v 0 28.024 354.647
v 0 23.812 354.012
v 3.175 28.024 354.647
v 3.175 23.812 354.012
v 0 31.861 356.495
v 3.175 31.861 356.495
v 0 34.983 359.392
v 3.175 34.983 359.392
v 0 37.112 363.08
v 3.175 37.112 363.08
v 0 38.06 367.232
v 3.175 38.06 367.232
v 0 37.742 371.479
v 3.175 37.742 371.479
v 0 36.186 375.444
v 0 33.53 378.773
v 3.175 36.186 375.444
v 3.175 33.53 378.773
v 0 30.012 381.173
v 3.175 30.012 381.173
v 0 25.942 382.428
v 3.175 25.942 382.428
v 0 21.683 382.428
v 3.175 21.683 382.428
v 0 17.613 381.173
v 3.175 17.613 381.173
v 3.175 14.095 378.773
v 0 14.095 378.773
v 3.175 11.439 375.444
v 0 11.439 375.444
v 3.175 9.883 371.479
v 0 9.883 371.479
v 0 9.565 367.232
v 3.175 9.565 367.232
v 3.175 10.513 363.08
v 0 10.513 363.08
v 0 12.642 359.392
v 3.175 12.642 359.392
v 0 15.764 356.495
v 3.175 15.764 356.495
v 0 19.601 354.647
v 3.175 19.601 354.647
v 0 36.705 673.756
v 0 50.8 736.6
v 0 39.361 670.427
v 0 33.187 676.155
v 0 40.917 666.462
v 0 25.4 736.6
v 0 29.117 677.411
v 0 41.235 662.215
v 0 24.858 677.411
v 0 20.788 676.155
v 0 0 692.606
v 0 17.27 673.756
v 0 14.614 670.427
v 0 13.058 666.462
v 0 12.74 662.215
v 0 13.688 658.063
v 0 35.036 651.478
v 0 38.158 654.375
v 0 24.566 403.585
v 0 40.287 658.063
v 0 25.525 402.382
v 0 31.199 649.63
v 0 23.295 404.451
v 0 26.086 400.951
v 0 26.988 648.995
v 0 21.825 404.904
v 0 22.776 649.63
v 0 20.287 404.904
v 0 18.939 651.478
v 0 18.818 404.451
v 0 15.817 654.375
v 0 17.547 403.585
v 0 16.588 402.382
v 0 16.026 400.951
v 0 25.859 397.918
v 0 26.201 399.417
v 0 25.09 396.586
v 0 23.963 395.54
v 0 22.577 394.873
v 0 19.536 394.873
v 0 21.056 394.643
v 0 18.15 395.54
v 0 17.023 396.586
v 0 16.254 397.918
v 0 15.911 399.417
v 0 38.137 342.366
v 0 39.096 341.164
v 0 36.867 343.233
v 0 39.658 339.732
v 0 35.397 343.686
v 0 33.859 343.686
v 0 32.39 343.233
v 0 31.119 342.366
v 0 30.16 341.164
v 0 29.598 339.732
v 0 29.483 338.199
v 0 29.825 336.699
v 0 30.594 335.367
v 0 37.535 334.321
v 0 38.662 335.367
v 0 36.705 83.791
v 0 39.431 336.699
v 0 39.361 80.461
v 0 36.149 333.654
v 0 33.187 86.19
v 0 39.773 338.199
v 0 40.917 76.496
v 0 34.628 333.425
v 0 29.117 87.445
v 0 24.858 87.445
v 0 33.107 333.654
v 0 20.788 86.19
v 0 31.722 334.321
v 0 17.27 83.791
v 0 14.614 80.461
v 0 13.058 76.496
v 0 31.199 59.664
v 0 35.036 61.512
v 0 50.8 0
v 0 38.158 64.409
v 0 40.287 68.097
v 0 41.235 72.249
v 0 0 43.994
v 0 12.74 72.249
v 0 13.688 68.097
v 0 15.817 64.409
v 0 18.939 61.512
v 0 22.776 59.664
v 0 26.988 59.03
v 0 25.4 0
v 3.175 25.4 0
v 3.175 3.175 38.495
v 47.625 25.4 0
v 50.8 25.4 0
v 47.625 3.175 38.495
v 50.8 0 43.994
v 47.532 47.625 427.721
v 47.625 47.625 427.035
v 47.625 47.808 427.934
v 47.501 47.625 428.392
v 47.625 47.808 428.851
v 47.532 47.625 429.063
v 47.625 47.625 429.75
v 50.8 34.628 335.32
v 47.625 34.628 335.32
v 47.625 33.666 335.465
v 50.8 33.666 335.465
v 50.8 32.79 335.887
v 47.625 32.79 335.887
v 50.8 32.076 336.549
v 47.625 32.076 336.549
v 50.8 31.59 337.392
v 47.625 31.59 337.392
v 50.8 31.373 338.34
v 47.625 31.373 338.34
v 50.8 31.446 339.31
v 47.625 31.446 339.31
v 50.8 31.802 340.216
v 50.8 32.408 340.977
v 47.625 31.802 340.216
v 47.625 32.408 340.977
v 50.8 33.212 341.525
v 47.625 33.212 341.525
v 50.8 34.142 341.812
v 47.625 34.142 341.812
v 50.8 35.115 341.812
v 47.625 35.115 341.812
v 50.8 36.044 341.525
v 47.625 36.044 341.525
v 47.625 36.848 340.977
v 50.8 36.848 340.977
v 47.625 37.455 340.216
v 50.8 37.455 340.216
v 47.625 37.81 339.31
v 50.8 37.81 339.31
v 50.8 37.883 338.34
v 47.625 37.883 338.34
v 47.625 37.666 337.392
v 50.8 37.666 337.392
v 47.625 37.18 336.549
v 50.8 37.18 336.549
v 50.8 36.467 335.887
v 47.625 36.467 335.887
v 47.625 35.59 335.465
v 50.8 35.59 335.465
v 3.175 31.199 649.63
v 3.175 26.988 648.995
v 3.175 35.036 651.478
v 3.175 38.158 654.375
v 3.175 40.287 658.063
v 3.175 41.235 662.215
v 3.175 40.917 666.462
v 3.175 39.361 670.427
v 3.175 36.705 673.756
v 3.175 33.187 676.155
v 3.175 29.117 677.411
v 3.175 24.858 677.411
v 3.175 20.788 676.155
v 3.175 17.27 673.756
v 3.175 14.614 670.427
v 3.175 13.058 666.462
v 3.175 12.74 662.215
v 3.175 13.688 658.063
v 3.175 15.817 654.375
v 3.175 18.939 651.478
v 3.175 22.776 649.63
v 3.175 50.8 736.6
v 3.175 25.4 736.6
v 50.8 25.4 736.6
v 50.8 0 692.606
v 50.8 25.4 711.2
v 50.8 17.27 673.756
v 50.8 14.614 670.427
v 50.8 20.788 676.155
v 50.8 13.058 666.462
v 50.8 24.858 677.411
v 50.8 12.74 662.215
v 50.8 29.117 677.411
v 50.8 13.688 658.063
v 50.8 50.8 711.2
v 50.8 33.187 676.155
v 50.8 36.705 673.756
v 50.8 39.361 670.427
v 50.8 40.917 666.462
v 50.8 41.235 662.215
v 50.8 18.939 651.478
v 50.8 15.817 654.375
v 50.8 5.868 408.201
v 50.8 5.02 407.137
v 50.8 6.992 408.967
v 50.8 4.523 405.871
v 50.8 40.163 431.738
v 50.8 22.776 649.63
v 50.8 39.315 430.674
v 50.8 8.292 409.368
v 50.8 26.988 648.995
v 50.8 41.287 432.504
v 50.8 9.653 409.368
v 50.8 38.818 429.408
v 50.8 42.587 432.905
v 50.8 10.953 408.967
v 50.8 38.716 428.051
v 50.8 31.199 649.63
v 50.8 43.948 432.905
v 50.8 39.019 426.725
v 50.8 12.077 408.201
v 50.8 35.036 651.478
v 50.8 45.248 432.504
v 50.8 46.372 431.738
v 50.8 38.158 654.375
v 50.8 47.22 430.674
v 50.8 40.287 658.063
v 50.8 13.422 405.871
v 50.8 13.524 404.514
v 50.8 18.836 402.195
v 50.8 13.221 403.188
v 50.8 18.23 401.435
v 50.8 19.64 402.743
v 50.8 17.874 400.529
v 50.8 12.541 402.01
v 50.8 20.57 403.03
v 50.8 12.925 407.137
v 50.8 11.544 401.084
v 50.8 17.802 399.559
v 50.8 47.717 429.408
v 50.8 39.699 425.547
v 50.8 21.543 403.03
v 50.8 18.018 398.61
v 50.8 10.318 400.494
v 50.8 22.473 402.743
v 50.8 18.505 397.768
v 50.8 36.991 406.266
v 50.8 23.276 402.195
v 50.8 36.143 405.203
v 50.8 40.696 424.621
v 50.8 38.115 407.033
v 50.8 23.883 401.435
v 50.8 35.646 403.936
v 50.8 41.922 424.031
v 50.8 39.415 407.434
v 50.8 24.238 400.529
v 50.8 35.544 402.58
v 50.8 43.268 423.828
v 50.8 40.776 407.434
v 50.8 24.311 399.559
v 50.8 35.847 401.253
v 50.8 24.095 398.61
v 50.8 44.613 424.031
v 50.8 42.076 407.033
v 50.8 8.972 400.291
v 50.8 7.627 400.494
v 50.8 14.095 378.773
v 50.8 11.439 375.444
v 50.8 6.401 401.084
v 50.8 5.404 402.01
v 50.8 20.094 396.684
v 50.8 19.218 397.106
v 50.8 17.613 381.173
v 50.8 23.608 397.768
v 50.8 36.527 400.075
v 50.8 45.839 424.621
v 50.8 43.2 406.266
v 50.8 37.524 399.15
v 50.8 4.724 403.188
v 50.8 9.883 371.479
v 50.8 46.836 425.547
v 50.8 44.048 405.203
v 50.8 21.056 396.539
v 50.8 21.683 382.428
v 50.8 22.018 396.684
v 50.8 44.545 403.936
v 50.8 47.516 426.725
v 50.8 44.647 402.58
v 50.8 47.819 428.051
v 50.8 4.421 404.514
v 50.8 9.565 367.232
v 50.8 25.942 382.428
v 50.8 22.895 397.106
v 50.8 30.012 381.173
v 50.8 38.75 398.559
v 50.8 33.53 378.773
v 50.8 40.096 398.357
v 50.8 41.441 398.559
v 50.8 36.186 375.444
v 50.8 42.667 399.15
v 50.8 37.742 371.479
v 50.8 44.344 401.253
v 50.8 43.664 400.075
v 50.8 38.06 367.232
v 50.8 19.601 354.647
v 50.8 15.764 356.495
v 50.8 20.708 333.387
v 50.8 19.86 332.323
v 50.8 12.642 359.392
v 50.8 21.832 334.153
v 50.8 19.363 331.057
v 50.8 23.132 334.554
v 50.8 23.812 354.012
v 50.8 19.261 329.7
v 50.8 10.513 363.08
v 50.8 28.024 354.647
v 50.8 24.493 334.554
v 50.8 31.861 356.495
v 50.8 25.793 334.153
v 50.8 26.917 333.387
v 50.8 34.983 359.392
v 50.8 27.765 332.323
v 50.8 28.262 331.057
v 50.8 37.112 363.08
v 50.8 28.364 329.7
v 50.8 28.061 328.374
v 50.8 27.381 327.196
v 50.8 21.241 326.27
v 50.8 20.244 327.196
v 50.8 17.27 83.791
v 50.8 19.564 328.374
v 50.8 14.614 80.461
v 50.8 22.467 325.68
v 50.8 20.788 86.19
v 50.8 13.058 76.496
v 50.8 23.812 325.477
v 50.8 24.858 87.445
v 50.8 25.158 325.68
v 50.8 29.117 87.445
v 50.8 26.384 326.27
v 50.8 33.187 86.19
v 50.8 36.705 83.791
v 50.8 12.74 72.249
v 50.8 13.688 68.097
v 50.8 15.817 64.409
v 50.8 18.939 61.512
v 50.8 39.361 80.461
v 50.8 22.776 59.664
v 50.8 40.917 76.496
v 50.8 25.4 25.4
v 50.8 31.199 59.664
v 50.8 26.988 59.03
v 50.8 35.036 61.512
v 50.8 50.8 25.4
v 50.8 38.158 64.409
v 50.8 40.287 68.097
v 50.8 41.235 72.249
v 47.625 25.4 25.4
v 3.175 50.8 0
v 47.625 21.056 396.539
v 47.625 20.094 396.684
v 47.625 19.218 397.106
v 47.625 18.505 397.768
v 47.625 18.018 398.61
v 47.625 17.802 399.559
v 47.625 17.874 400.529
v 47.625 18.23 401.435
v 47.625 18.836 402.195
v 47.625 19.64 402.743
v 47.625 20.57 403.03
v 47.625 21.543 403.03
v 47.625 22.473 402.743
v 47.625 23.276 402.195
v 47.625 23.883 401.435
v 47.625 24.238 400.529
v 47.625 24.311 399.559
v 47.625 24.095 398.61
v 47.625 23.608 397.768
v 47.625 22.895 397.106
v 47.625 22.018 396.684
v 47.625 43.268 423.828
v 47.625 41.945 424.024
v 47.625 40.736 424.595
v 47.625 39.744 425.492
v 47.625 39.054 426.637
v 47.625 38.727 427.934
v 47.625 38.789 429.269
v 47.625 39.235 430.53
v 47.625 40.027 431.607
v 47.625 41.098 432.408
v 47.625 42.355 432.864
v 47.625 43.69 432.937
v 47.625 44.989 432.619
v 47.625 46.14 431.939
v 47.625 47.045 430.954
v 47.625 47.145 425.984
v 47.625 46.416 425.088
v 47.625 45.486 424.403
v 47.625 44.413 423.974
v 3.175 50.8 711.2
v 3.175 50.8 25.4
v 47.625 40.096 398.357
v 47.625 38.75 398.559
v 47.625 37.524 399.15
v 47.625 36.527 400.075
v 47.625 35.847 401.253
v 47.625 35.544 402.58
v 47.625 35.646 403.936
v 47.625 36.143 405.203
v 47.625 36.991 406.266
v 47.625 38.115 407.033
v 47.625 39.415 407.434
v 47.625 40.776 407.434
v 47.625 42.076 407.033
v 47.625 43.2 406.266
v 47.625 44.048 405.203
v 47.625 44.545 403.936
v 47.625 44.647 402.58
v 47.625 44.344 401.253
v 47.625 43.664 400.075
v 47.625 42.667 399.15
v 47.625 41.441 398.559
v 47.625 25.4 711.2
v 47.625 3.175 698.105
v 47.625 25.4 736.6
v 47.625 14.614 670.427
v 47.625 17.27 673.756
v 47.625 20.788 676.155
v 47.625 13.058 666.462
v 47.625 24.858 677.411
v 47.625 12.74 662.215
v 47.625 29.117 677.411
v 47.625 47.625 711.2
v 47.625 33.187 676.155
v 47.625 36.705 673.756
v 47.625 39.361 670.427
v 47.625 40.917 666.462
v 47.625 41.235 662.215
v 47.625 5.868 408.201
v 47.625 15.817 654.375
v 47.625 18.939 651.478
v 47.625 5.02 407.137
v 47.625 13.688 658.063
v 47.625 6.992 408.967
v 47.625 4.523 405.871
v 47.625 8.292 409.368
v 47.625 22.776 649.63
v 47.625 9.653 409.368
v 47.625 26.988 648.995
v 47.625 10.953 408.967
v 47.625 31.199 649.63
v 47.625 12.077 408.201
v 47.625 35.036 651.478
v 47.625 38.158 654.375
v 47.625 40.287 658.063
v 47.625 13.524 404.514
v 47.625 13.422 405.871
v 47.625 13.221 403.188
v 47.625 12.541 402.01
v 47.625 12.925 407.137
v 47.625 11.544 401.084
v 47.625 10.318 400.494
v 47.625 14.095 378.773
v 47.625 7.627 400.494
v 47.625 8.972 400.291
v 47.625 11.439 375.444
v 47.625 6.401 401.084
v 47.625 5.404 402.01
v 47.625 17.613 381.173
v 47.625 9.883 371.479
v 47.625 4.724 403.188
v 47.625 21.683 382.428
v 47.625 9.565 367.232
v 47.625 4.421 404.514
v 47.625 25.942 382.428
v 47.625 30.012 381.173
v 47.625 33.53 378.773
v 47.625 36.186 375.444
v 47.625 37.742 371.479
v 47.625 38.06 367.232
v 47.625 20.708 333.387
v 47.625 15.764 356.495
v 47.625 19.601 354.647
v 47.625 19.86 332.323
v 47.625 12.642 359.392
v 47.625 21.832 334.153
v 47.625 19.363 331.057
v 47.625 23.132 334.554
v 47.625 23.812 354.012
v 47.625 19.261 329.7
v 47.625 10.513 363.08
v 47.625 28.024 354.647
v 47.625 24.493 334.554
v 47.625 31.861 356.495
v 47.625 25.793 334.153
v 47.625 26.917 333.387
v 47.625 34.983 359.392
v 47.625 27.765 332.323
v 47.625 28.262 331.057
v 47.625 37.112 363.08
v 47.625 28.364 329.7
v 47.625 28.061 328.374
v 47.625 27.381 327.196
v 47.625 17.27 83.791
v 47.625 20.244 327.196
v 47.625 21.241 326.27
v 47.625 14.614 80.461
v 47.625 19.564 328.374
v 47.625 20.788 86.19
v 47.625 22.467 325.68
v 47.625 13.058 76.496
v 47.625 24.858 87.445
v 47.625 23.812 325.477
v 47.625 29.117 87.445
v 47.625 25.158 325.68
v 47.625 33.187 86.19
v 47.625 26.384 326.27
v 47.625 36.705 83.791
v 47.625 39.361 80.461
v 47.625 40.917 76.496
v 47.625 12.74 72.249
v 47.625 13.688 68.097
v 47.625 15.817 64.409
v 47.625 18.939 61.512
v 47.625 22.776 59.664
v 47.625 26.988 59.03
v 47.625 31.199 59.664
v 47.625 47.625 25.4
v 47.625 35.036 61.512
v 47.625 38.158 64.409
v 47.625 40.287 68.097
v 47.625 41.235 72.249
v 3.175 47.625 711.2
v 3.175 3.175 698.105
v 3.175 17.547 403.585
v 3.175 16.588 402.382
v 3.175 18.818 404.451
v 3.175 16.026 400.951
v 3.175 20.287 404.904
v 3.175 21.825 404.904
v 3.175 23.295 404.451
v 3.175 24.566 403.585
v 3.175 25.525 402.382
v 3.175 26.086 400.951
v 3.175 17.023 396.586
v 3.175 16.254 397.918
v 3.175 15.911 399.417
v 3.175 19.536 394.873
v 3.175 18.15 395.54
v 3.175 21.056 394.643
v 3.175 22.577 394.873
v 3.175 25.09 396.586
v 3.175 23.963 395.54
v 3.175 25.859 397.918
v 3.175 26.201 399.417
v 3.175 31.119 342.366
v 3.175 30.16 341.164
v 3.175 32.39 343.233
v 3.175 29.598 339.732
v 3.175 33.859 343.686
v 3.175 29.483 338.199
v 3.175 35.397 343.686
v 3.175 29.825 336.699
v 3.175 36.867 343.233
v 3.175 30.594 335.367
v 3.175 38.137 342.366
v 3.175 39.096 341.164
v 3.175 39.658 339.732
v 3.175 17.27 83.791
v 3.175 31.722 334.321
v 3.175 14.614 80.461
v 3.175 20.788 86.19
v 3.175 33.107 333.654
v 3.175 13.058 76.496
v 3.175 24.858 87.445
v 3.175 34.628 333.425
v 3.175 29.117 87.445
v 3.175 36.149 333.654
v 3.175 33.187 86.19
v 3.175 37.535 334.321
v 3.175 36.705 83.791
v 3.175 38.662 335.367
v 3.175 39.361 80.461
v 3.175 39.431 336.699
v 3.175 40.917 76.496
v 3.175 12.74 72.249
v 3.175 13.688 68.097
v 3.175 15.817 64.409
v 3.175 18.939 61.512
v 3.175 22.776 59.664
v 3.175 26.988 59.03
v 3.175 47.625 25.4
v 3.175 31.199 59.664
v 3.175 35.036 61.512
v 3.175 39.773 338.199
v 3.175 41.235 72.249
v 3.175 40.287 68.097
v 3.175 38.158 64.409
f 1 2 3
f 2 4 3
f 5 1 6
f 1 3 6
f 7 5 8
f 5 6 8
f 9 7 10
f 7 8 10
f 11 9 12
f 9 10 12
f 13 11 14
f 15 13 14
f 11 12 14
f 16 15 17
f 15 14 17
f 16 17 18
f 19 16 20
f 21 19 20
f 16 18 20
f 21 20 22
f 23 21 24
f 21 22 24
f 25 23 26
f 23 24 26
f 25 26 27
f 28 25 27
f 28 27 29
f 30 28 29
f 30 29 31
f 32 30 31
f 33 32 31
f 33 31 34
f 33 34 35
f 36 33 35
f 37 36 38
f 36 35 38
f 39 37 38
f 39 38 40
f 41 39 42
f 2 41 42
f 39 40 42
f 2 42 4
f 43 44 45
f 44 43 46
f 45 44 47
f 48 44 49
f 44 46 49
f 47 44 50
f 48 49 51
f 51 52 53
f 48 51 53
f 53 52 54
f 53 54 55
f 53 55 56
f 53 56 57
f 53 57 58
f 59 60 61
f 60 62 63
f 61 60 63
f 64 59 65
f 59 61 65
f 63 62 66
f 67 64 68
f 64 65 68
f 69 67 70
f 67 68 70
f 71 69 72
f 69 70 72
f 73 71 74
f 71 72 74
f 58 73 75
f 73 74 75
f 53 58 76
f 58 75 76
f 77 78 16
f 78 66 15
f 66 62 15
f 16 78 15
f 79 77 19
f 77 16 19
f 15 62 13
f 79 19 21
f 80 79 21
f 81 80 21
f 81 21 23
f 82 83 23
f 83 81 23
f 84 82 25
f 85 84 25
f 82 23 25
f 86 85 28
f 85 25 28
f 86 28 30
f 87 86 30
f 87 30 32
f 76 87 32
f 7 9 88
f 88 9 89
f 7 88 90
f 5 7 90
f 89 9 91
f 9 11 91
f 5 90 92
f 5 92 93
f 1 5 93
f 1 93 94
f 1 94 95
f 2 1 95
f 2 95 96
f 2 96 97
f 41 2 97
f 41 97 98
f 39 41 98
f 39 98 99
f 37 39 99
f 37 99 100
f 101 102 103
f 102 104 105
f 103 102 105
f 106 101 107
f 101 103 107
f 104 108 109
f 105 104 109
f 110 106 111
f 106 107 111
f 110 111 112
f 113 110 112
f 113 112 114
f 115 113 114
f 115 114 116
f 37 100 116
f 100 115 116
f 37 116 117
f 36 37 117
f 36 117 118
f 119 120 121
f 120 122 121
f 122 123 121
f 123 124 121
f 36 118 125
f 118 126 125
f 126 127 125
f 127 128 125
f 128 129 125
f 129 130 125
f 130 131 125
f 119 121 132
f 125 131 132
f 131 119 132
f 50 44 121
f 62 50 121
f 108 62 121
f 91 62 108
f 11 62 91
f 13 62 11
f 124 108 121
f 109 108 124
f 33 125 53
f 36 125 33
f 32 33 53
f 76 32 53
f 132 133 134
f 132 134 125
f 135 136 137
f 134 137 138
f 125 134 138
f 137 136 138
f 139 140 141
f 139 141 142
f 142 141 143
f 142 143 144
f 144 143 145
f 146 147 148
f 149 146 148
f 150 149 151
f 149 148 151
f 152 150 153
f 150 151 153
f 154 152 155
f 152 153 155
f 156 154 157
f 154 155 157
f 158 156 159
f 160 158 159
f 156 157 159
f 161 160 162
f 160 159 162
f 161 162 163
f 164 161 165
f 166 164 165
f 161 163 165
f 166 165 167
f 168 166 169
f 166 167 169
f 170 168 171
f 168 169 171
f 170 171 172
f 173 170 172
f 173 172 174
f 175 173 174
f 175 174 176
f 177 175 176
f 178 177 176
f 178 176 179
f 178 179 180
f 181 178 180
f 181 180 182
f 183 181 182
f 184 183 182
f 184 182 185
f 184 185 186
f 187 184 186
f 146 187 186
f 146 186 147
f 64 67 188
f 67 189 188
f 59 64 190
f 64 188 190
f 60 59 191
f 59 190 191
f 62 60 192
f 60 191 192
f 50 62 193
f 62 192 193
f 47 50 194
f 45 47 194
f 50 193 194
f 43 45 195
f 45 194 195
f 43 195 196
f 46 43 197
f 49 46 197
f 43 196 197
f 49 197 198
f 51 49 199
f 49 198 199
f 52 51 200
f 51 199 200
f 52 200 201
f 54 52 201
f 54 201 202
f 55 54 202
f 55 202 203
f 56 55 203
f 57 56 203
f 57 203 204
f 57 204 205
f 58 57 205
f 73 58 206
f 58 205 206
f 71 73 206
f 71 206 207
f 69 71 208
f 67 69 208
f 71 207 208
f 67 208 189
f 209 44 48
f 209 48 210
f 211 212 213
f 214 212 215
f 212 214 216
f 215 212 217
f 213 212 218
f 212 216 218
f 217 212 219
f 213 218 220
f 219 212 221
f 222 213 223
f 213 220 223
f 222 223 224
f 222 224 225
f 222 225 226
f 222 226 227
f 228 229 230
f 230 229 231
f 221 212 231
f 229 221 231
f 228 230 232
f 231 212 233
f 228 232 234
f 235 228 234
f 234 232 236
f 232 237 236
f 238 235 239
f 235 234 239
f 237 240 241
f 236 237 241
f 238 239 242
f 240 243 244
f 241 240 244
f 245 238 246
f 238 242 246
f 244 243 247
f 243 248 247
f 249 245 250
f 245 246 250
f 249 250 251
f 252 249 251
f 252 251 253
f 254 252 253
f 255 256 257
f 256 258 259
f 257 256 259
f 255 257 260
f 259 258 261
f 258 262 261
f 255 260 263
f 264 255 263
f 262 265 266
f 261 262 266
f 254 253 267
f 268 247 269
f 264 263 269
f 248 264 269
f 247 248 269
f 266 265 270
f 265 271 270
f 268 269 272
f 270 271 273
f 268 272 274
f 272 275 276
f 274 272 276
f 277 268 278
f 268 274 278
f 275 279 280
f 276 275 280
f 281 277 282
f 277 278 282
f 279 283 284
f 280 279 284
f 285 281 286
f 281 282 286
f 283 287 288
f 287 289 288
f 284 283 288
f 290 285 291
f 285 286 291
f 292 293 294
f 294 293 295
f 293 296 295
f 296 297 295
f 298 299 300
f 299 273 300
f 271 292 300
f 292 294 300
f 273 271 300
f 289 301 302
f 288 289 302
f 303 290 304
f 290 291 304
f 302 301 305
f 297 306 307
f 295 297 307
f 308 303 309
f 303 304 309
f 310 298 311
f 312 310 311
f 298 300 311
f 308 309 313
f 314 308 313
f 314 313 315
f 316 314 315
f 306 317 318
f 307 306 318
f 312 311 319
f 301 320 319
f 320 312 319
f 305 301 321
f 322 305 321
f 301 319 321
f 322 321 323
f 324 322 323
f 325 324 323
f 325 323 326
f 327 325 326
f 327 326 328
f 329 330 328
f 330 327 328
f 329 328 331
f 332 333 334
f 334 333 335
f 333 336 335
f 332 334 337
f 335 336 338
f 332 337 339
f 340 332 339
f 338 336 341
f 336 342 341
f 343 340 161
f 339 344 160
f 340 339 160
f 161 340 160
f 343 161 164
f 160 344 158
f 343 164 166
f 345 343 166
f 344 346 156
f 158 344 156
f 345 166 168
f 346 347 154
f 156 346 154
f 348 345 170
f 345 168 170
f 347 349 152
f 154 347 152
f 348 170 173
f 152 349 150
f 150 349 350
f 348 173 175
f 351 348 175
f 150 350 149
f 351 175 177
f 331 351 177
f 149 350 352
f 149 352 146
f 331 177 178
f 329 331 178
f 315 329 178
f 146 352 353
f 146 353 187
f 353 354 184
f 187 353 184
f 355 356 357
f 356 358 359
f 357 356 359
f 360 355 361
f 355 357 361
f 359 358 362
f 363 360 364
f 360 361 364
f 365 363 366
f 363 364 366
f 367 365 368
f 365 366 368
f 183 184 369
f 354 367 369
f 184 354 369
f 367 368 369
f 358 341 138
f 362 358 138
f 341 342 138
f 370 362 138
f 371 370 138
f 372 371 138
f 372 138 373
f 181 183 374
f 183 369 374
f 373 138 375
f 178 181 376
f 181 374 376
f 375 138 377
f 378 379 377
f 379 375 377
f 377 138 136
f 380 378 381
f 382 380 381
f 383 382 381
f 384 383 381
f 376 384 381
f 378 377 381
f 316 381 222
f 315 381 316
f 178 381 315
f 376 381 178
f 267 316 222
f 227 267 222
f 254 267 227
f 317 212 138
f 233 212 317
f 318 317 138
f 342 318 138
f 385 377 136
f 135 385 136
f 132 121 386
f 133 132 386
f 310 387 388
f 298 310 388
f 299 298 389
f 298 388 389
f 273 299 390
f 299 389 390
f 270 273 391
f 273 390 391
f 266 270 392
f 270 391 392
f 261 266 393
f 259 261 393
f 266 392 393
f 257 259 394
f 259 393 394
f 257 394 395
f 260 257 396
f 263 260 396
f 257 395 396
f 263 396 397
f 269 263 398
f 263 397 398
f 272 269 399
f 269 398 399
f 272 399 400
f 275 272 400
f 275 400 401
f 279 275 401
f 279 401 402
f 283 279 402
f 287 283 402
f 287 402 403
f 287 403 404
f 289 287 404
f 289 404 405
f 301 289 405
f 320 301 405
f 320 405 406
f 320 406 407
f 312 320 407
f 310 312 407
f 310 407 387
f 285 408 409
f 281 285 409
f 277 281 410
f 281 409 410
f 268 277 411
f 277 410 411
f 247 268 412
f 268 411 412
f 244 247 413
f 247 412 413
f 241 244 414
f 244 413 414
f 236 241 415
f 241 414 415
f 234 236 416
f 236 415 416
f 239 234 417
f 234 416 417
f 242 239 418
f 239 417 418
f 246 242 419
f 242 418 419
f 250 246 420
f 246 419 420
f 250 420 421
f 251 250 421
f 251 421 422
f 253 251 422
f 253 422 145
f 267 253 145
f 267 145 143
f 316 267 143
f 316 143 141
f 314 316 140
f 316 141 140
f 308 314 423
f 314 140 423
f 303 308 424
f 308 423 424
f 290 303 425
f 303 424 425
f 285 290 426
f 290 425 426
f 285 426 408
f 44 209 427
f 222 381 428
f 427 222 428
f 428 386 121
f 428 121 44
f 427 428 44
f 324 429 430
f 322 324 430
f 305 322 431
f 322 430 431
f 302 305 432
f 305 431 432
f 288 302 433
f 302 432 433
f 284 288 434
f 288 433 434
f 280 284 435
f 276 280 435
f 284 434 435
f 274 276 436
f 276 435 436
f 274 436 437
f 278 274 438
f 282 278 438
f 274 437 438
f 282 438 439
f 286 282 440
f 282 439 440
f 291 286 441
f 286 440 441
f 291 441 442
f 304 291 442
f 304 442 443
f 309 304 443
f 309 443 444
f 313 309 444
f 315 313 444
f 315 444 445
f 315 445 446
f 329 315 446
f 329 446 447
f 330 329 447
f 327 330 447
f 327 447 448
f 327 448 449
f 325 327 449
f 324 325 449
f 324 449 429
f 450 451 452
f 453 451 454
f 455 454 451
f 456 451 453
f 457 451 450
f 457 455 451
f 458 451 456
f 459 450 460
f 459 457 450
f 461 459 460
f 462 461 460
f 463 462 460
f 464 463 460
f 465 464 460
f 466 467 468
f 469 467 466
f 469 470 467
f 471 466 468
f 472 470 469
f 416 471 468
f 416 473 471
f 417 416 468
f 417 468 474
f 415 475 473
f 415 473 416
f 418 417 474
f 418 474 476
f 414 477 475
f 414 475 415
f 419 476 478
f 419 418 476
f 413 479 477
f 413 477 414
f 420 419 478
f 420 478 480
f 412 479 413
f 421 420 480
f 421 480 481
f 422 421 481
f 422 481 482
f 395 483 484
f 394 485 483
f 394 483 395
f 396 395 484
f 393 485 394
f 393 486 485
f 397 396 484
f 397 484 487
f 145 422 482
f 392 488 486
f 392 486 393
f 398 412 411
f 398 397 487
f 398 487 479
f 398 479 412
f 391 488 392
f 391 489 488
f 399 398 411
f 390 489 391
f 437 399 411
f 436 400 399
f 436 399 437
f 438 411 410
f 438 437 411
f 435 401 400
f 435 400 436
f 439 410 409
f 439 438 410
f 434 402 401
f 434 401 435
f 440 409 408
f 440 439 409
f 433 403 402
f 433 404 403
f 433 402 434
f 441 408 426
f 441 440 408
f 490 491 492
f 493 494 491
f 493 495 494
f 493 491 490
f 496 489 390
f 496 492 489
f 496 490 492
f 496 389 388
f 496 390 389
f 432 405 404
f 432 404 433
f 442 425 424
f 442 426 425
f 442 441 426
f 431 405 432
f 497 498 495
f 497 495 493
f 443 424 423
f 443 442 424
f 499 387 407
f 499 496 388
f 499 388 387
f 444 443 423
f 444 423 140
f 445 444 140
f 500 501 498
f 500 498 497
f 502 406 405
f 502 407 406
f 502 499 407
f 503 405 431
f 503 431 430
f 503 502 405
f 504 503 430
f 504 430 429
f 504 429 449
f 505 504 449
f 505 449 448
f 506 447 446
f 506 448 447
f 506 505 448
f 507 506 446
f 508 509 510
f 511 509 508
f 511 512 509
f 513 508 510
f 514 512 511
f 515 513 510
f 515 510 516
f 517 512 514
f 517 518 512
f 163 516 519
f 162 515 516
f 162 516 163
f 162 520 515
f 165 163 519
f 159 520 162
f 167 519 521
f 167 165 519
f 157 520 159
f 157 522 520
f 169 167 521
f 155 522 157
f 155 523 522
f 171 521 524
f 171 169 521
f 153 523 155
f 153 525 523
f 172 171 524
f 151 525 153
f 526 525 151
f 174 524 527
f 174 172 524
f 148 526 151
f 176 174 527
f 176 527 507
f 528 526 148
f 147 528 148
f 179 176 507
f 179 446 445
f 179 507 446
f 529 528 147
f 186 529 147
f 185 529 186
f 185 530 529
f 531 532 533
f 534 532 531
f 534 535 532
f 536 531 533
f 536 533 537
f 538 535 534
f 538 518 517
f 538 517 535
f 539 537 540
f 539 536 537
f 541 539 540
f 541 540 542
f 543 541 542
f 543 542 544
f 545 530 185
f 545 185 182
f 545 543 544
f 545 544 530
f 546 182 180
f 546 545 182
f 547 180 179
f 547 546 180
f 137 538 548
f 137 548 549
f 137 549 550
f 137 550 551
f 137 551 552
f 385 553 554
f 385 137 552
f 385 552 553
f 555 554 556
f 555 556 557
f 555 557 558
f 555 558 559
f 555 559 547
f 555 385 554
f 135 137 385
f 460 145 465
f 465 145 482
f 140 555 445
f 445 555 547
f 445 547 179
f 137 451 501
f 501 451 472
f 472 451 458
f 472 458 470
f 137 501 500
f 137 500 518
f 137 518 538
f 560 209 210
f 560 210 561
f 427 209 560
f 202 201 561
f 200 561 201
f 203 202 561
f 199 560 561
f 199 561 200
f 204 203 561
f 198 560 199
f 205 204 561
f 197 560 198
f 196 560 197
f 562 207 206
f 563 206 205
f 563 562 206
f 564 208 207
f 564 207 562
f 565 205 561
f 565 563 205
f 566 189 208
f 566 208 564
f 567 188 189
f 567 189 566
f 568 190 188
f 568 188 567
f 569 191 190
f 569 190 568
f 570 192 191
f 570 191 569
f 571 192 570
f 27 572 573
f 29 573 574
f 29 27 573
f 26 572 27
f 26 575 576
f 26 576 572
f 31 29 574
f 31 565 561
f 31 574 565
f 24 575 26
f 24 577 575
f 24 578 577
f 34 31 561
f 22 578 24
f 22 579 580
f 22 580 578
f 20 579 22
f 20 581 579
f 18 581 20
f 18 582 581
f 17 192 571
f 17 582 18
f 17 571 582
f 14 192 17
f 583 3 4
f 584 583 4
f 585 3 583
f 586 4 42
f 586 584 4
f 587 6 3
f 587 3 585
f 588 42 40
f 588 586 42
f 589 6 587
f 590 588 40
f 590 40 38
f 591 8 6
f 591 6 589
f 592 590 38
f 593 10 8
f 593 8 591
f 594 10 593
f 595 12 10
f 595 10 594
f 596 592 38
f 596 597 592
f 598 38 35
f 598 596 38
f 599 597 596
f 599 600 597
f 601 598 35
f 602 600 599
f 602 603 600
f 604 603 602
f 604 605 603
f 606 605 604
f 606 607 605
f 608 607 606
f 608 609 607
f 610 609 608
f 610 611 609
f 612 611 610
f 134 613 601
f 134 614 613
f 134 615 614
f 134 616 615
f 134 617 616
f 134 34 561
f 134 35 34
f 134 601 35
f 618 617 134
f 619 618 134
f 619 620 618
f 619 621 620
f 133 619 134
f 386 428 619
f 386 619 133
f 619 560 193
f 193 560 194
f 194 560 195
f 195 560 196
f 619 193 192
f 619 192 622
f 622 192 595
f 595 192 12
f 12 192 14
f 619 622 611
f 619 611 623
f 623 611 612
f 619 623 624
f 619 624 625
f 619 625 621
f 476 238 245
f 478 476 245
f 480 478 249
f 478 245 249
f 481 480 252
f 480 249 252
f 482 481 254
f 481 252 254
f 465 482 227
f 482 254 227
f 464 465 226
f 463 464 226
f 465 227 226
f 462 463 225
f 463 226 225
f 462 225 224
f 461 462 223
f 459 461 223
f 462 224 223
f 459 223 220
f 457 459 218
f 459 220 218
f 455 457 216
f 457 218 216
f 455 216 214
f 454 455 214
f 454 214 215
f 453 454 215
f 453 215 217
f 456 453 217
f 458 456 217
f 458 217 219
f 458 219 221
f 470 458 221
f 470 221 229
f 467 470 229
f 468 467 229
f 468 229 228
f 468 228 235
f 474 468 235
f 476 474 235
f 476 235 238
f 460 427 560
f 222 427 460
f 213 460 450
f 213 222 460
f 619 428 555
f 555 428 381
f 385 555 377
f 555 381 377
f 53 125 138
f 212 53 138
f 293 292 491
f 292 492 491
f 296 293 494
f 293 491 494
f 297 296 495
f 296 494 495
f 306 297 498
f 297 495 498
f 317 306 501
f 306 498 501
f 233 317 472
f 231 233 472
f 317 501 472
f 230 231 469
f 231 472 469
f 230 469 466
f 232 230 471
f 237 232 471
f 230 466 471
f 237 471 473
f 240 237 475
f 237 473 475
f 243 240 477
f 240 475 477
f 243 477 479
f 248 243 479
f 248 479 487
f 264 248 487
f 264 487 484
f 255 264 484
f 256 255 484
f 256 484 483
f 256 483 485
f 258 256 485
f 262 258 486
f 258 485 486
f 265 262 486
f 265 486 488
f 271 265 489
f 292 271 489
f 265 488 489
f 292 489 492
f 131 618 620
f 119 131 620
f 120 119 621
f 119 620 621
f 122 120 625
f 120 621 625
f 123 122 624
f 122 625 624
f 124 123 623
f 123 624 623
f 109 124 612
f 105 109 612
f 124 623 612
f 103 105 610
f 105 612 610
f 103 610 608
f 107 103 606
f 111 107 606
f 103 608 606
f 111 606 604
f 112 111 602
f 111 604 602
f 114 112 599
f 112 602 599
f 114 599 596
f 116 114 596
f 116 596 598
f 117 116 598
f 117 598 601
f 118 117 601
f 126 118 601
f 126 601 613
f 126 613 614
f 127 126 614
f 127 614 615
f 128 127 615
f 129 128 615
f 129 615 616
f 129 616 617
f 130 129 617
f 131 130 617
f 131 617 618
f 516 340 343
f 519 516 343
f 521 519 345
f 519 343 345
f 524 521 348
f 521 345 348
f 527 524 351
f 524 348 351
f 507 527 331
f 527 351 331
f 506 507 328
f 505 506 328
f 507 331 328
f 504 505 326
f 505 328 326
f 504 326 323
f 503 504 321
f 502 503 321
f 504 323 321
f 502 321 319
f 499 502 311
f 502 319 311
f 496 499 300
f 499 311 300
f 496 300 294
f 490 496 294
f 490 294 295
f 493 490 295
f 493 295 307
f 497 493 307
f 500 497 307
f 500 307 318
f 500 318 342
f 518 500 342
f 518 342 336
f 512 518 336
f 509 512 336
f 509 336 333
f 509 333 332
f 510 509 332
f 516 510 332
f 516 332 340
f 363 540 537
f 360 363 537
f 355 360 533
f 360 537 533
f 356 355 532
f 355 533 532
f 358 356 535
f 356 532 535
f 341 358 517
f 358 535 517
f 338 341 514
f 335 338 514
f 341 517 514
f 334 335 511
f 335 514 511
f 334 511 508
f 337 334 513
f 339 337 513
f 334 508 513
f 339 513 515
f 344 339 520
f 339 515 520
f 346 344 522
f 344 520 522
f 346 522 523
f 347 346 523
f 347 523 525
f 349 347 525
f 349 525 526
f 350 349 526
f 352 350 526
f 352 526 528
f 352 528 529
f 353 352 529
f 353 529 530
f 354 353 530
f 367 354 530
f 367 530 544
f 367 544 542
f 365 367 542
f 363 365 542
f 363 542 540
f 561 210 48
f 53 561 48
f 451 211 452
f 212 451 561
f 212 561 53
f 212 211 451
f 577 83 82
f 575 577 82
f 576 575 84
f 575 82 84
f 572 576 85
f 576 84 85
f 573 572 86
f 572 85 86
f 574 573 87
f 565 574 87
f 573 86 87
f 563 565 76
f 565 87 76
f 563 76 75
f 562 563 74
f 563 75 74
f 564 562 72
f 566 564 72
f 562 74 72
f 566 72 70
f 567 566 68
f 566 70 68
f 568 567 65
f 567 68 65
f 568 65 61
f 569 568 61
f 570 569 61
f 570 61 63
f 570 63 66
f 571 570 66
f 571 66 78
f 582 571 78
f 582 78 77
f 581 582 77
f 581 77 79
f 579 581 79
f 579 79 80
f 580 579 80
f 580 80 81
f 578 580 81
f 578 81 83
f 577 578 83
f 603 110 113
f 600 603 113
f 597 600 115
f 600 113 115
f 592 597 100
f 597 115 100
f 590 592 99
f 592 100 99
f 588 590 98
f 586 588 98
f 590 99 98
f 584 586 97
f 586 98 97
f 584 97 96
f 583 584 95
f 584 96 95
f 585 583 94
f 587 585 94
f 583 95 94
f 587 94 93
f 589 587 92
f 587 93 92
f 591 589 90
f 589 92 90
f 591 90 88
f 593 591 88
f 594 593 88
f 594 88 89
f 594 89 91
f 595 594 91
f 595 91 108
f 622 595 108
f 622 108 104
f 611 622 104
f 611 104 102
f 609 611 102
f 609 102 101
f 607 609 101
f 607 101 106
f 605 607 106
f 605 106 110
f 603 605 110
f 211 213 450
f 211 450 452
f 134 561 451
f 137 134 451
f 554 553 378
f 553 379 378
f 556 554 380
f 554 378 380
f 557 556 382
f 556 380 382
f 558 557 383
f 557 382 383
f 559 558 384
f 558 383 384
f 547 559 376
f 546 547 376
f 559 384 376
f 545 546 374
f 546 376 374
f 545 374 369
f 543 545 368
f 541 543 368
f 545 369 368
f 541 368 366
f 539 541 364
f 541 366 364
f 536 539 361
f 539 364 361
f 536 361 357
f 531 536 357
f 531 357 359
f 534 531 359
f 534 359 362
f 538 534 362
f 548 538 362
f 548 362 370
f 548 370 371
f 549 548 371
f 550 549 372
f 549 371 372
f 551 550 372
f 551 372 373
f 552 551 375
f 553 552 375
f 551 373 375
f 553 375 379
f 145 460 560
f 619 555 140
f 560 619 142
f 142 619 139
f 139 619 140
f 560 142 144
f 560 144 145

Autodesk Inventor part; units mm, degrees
ref_plane "YZ Plane" through (0, 0, 0) normal (1, 0, 0) x (0, 1, 0)
ref_plane "XZ Plane" through (0, 0, 0) normal (0, 1, 0) x (-1, 0, 0)
ref_plane "XY Plane" through (0, 0, 0) normal (0, 0, 1) x (1, 0, 0)
sketch "Sketch1" plane through (0, 0, 0) normal (0, 0, 1) x (1, 0, 0)
  line L0 (0, 0) -> (50.8, 0)
  line L1 (50.8, 0) -> (50.8, 50.8)
  line L2 (50.8, 50.8) -> (0, 50.8)
  line L3 (0, 50.8) -> (0, 0)
  line L4 (3.175, 3.175) -> (47.625, 3.175)
  line L5 (47.625, 3.175) -> (47.625, 47.625)
  line L6 (47.625, 47.625) -> (3.175, 47.625)
  line L7 (3.175, 47.625) -> (3.175, 3.175)
  dimension "d0" = 50.8
  dimension "d1" = 50.8
  dimension "d2" = 44.45
  dimension "d3" = 44.45
  dimension "d4" = 3.175
  dimension "d5" = 3.175
extrude "Extrusion1" add sketch "Sketch1" along normal blind 736.6
sketch "Sketch2" plane through (50.8, 0, 0) normal (1, 0, 0) x (0, 0, -1)
  line L0 (-736.6, 50.8) -> (-711.2, 50.8)
  line L1 (-711.2, 50.8) -> (-711.2, 25.4)
  line L2 (-711.2, 25.4) -> (-736.6, 25.4)
  line L3 (-736.6, 25.4) -> (-736.6, 50.8)
  line L4 (0, 50.8) -> (-25.4, 50.8)
  line L5 (-25.4, 50.8) -> (-25.4, 25.4)
  line L6 (-25.4, 25.4) -> (0, 25.4)
  line L7 (0, 25.4) -> (0, 50.8)
  line L8 (0, 0) -> (-736.6, 0) projected
  line L9 (-736.6, 25.4) -> (-692.6059, 0)
  line L10 (0, 25.4) -> (-43.9941, 0)
  line L11 (0, 0) -> (0, 50.8) projected
  line L12 (-736.6, 0) -> (-736.6, 50.8) projected
  line L13 (-43.9941, 0) -> (0, 0)
  line L14 (0, 25.4) -> (0, 0)
  line L15 (-736.6, 25.4) -> (-736.6, 0)
  line L16 (-692.6059, 0) -> (-736.6, 0)
  line L17 (0, 50.8) -> (-736.6, 50.8) projected
  line L18 (-736.6, 25.4) -> (0, 25.4) construction
  line L19 (-368.3, 50.8) -> (-368.3, 0) construction
  circle A0 centre (-368.3, 23.8125) radius 14.2875
  circle A1 centre (-73.3171, 26.9875) radius 14.2875
  circle A2 centre (-663.2829, 26.9875) radius 14.2875
  point P0 (-402.9207, 40.0955)
  point P1 (-399.8027, 21.0564)
  point P2 (-338.5841, 34.6282)
  point P3 (-330.0412, 23.8125)
  point P4 (-404.8552, 8.9725)
  point P5 (-428.3922, 43.2675)
  dimension "d8" = 25.4
  dimension "d9" = 25.4
  dimension "d10" = 25.4
  dimension "d11" = 25.4
  dimension "d14" = 30
  dimension "d15" = 30
  dimension "d18" = 28.575
  dimension "d19" = 1.5875
  dimension "d22" = 295
  dimension "d23" = 28.575
  dimension "d24" = 28.575
  dimension "d25" = 295
  dimension "d26" = 1.5875
  dimension "d27" = 1.5875
extrude "Extrusion2" cut sketch "Sketch2" against normal up to surface (47.625 mm away) contours L0 L1 L2 L3 | L4 L7 L6 L5
extrude "Extrusion3" cut sketch "Sketch2" against normal through all contours L9 L8 L12 | L10 L11 L8
extrude "Extrusion4" cut sketch "Sketch2" against normal through all contours A0 | A1 | A2
hole "Hole1" at (50.8, 40.0955, 402.9207) at (50.8, 8.9725, 404.8552) at (50.8, 23.8125, 330.0412) at (50.8, 43.2675, 428.3922) direction (-1, 0, 0) diameter 9.1281 depth 3.175 tip angle 118
hole "Hole2" at (50.8, 21.0564, 399.8027) at (50.8, 34.6282, 338.5841) direction (-1, 0, 0) diameter 6.5278 depth 25.4 tip angle 118 clearance for "Socket Head Cap Screw" size "1/4" standard "Ansi Unified Screw Threads"
sketch "Sketch3" plane through (3.175, 47.625, 711.2) normal (1, 0, 0) x (0, 0, -1)
  circle A0 centre (311.3973, -26.5686) radius 3.2639 projected
  circle A1 centre (372.6159, -12.9968) radius 3.2639 projected
  point P0 (711.2, -47.625)
hole "Hole3" at (3.175, 21.0564, 399.8027) at (3.175, 34.6282, 338.5841) direction (-1, 0, 0) diameter 10.3188 end through all
equation "\"d8\" = d9"
equation "\"d9\" = d11"
equation "\"d11\" = d10"
equation "\"d15\" = d14"
equation "\"d22\" = d25"
equation "\"d23\" = d18"
equation "\"d24\" = d18"
properties part number "Tube - left"
